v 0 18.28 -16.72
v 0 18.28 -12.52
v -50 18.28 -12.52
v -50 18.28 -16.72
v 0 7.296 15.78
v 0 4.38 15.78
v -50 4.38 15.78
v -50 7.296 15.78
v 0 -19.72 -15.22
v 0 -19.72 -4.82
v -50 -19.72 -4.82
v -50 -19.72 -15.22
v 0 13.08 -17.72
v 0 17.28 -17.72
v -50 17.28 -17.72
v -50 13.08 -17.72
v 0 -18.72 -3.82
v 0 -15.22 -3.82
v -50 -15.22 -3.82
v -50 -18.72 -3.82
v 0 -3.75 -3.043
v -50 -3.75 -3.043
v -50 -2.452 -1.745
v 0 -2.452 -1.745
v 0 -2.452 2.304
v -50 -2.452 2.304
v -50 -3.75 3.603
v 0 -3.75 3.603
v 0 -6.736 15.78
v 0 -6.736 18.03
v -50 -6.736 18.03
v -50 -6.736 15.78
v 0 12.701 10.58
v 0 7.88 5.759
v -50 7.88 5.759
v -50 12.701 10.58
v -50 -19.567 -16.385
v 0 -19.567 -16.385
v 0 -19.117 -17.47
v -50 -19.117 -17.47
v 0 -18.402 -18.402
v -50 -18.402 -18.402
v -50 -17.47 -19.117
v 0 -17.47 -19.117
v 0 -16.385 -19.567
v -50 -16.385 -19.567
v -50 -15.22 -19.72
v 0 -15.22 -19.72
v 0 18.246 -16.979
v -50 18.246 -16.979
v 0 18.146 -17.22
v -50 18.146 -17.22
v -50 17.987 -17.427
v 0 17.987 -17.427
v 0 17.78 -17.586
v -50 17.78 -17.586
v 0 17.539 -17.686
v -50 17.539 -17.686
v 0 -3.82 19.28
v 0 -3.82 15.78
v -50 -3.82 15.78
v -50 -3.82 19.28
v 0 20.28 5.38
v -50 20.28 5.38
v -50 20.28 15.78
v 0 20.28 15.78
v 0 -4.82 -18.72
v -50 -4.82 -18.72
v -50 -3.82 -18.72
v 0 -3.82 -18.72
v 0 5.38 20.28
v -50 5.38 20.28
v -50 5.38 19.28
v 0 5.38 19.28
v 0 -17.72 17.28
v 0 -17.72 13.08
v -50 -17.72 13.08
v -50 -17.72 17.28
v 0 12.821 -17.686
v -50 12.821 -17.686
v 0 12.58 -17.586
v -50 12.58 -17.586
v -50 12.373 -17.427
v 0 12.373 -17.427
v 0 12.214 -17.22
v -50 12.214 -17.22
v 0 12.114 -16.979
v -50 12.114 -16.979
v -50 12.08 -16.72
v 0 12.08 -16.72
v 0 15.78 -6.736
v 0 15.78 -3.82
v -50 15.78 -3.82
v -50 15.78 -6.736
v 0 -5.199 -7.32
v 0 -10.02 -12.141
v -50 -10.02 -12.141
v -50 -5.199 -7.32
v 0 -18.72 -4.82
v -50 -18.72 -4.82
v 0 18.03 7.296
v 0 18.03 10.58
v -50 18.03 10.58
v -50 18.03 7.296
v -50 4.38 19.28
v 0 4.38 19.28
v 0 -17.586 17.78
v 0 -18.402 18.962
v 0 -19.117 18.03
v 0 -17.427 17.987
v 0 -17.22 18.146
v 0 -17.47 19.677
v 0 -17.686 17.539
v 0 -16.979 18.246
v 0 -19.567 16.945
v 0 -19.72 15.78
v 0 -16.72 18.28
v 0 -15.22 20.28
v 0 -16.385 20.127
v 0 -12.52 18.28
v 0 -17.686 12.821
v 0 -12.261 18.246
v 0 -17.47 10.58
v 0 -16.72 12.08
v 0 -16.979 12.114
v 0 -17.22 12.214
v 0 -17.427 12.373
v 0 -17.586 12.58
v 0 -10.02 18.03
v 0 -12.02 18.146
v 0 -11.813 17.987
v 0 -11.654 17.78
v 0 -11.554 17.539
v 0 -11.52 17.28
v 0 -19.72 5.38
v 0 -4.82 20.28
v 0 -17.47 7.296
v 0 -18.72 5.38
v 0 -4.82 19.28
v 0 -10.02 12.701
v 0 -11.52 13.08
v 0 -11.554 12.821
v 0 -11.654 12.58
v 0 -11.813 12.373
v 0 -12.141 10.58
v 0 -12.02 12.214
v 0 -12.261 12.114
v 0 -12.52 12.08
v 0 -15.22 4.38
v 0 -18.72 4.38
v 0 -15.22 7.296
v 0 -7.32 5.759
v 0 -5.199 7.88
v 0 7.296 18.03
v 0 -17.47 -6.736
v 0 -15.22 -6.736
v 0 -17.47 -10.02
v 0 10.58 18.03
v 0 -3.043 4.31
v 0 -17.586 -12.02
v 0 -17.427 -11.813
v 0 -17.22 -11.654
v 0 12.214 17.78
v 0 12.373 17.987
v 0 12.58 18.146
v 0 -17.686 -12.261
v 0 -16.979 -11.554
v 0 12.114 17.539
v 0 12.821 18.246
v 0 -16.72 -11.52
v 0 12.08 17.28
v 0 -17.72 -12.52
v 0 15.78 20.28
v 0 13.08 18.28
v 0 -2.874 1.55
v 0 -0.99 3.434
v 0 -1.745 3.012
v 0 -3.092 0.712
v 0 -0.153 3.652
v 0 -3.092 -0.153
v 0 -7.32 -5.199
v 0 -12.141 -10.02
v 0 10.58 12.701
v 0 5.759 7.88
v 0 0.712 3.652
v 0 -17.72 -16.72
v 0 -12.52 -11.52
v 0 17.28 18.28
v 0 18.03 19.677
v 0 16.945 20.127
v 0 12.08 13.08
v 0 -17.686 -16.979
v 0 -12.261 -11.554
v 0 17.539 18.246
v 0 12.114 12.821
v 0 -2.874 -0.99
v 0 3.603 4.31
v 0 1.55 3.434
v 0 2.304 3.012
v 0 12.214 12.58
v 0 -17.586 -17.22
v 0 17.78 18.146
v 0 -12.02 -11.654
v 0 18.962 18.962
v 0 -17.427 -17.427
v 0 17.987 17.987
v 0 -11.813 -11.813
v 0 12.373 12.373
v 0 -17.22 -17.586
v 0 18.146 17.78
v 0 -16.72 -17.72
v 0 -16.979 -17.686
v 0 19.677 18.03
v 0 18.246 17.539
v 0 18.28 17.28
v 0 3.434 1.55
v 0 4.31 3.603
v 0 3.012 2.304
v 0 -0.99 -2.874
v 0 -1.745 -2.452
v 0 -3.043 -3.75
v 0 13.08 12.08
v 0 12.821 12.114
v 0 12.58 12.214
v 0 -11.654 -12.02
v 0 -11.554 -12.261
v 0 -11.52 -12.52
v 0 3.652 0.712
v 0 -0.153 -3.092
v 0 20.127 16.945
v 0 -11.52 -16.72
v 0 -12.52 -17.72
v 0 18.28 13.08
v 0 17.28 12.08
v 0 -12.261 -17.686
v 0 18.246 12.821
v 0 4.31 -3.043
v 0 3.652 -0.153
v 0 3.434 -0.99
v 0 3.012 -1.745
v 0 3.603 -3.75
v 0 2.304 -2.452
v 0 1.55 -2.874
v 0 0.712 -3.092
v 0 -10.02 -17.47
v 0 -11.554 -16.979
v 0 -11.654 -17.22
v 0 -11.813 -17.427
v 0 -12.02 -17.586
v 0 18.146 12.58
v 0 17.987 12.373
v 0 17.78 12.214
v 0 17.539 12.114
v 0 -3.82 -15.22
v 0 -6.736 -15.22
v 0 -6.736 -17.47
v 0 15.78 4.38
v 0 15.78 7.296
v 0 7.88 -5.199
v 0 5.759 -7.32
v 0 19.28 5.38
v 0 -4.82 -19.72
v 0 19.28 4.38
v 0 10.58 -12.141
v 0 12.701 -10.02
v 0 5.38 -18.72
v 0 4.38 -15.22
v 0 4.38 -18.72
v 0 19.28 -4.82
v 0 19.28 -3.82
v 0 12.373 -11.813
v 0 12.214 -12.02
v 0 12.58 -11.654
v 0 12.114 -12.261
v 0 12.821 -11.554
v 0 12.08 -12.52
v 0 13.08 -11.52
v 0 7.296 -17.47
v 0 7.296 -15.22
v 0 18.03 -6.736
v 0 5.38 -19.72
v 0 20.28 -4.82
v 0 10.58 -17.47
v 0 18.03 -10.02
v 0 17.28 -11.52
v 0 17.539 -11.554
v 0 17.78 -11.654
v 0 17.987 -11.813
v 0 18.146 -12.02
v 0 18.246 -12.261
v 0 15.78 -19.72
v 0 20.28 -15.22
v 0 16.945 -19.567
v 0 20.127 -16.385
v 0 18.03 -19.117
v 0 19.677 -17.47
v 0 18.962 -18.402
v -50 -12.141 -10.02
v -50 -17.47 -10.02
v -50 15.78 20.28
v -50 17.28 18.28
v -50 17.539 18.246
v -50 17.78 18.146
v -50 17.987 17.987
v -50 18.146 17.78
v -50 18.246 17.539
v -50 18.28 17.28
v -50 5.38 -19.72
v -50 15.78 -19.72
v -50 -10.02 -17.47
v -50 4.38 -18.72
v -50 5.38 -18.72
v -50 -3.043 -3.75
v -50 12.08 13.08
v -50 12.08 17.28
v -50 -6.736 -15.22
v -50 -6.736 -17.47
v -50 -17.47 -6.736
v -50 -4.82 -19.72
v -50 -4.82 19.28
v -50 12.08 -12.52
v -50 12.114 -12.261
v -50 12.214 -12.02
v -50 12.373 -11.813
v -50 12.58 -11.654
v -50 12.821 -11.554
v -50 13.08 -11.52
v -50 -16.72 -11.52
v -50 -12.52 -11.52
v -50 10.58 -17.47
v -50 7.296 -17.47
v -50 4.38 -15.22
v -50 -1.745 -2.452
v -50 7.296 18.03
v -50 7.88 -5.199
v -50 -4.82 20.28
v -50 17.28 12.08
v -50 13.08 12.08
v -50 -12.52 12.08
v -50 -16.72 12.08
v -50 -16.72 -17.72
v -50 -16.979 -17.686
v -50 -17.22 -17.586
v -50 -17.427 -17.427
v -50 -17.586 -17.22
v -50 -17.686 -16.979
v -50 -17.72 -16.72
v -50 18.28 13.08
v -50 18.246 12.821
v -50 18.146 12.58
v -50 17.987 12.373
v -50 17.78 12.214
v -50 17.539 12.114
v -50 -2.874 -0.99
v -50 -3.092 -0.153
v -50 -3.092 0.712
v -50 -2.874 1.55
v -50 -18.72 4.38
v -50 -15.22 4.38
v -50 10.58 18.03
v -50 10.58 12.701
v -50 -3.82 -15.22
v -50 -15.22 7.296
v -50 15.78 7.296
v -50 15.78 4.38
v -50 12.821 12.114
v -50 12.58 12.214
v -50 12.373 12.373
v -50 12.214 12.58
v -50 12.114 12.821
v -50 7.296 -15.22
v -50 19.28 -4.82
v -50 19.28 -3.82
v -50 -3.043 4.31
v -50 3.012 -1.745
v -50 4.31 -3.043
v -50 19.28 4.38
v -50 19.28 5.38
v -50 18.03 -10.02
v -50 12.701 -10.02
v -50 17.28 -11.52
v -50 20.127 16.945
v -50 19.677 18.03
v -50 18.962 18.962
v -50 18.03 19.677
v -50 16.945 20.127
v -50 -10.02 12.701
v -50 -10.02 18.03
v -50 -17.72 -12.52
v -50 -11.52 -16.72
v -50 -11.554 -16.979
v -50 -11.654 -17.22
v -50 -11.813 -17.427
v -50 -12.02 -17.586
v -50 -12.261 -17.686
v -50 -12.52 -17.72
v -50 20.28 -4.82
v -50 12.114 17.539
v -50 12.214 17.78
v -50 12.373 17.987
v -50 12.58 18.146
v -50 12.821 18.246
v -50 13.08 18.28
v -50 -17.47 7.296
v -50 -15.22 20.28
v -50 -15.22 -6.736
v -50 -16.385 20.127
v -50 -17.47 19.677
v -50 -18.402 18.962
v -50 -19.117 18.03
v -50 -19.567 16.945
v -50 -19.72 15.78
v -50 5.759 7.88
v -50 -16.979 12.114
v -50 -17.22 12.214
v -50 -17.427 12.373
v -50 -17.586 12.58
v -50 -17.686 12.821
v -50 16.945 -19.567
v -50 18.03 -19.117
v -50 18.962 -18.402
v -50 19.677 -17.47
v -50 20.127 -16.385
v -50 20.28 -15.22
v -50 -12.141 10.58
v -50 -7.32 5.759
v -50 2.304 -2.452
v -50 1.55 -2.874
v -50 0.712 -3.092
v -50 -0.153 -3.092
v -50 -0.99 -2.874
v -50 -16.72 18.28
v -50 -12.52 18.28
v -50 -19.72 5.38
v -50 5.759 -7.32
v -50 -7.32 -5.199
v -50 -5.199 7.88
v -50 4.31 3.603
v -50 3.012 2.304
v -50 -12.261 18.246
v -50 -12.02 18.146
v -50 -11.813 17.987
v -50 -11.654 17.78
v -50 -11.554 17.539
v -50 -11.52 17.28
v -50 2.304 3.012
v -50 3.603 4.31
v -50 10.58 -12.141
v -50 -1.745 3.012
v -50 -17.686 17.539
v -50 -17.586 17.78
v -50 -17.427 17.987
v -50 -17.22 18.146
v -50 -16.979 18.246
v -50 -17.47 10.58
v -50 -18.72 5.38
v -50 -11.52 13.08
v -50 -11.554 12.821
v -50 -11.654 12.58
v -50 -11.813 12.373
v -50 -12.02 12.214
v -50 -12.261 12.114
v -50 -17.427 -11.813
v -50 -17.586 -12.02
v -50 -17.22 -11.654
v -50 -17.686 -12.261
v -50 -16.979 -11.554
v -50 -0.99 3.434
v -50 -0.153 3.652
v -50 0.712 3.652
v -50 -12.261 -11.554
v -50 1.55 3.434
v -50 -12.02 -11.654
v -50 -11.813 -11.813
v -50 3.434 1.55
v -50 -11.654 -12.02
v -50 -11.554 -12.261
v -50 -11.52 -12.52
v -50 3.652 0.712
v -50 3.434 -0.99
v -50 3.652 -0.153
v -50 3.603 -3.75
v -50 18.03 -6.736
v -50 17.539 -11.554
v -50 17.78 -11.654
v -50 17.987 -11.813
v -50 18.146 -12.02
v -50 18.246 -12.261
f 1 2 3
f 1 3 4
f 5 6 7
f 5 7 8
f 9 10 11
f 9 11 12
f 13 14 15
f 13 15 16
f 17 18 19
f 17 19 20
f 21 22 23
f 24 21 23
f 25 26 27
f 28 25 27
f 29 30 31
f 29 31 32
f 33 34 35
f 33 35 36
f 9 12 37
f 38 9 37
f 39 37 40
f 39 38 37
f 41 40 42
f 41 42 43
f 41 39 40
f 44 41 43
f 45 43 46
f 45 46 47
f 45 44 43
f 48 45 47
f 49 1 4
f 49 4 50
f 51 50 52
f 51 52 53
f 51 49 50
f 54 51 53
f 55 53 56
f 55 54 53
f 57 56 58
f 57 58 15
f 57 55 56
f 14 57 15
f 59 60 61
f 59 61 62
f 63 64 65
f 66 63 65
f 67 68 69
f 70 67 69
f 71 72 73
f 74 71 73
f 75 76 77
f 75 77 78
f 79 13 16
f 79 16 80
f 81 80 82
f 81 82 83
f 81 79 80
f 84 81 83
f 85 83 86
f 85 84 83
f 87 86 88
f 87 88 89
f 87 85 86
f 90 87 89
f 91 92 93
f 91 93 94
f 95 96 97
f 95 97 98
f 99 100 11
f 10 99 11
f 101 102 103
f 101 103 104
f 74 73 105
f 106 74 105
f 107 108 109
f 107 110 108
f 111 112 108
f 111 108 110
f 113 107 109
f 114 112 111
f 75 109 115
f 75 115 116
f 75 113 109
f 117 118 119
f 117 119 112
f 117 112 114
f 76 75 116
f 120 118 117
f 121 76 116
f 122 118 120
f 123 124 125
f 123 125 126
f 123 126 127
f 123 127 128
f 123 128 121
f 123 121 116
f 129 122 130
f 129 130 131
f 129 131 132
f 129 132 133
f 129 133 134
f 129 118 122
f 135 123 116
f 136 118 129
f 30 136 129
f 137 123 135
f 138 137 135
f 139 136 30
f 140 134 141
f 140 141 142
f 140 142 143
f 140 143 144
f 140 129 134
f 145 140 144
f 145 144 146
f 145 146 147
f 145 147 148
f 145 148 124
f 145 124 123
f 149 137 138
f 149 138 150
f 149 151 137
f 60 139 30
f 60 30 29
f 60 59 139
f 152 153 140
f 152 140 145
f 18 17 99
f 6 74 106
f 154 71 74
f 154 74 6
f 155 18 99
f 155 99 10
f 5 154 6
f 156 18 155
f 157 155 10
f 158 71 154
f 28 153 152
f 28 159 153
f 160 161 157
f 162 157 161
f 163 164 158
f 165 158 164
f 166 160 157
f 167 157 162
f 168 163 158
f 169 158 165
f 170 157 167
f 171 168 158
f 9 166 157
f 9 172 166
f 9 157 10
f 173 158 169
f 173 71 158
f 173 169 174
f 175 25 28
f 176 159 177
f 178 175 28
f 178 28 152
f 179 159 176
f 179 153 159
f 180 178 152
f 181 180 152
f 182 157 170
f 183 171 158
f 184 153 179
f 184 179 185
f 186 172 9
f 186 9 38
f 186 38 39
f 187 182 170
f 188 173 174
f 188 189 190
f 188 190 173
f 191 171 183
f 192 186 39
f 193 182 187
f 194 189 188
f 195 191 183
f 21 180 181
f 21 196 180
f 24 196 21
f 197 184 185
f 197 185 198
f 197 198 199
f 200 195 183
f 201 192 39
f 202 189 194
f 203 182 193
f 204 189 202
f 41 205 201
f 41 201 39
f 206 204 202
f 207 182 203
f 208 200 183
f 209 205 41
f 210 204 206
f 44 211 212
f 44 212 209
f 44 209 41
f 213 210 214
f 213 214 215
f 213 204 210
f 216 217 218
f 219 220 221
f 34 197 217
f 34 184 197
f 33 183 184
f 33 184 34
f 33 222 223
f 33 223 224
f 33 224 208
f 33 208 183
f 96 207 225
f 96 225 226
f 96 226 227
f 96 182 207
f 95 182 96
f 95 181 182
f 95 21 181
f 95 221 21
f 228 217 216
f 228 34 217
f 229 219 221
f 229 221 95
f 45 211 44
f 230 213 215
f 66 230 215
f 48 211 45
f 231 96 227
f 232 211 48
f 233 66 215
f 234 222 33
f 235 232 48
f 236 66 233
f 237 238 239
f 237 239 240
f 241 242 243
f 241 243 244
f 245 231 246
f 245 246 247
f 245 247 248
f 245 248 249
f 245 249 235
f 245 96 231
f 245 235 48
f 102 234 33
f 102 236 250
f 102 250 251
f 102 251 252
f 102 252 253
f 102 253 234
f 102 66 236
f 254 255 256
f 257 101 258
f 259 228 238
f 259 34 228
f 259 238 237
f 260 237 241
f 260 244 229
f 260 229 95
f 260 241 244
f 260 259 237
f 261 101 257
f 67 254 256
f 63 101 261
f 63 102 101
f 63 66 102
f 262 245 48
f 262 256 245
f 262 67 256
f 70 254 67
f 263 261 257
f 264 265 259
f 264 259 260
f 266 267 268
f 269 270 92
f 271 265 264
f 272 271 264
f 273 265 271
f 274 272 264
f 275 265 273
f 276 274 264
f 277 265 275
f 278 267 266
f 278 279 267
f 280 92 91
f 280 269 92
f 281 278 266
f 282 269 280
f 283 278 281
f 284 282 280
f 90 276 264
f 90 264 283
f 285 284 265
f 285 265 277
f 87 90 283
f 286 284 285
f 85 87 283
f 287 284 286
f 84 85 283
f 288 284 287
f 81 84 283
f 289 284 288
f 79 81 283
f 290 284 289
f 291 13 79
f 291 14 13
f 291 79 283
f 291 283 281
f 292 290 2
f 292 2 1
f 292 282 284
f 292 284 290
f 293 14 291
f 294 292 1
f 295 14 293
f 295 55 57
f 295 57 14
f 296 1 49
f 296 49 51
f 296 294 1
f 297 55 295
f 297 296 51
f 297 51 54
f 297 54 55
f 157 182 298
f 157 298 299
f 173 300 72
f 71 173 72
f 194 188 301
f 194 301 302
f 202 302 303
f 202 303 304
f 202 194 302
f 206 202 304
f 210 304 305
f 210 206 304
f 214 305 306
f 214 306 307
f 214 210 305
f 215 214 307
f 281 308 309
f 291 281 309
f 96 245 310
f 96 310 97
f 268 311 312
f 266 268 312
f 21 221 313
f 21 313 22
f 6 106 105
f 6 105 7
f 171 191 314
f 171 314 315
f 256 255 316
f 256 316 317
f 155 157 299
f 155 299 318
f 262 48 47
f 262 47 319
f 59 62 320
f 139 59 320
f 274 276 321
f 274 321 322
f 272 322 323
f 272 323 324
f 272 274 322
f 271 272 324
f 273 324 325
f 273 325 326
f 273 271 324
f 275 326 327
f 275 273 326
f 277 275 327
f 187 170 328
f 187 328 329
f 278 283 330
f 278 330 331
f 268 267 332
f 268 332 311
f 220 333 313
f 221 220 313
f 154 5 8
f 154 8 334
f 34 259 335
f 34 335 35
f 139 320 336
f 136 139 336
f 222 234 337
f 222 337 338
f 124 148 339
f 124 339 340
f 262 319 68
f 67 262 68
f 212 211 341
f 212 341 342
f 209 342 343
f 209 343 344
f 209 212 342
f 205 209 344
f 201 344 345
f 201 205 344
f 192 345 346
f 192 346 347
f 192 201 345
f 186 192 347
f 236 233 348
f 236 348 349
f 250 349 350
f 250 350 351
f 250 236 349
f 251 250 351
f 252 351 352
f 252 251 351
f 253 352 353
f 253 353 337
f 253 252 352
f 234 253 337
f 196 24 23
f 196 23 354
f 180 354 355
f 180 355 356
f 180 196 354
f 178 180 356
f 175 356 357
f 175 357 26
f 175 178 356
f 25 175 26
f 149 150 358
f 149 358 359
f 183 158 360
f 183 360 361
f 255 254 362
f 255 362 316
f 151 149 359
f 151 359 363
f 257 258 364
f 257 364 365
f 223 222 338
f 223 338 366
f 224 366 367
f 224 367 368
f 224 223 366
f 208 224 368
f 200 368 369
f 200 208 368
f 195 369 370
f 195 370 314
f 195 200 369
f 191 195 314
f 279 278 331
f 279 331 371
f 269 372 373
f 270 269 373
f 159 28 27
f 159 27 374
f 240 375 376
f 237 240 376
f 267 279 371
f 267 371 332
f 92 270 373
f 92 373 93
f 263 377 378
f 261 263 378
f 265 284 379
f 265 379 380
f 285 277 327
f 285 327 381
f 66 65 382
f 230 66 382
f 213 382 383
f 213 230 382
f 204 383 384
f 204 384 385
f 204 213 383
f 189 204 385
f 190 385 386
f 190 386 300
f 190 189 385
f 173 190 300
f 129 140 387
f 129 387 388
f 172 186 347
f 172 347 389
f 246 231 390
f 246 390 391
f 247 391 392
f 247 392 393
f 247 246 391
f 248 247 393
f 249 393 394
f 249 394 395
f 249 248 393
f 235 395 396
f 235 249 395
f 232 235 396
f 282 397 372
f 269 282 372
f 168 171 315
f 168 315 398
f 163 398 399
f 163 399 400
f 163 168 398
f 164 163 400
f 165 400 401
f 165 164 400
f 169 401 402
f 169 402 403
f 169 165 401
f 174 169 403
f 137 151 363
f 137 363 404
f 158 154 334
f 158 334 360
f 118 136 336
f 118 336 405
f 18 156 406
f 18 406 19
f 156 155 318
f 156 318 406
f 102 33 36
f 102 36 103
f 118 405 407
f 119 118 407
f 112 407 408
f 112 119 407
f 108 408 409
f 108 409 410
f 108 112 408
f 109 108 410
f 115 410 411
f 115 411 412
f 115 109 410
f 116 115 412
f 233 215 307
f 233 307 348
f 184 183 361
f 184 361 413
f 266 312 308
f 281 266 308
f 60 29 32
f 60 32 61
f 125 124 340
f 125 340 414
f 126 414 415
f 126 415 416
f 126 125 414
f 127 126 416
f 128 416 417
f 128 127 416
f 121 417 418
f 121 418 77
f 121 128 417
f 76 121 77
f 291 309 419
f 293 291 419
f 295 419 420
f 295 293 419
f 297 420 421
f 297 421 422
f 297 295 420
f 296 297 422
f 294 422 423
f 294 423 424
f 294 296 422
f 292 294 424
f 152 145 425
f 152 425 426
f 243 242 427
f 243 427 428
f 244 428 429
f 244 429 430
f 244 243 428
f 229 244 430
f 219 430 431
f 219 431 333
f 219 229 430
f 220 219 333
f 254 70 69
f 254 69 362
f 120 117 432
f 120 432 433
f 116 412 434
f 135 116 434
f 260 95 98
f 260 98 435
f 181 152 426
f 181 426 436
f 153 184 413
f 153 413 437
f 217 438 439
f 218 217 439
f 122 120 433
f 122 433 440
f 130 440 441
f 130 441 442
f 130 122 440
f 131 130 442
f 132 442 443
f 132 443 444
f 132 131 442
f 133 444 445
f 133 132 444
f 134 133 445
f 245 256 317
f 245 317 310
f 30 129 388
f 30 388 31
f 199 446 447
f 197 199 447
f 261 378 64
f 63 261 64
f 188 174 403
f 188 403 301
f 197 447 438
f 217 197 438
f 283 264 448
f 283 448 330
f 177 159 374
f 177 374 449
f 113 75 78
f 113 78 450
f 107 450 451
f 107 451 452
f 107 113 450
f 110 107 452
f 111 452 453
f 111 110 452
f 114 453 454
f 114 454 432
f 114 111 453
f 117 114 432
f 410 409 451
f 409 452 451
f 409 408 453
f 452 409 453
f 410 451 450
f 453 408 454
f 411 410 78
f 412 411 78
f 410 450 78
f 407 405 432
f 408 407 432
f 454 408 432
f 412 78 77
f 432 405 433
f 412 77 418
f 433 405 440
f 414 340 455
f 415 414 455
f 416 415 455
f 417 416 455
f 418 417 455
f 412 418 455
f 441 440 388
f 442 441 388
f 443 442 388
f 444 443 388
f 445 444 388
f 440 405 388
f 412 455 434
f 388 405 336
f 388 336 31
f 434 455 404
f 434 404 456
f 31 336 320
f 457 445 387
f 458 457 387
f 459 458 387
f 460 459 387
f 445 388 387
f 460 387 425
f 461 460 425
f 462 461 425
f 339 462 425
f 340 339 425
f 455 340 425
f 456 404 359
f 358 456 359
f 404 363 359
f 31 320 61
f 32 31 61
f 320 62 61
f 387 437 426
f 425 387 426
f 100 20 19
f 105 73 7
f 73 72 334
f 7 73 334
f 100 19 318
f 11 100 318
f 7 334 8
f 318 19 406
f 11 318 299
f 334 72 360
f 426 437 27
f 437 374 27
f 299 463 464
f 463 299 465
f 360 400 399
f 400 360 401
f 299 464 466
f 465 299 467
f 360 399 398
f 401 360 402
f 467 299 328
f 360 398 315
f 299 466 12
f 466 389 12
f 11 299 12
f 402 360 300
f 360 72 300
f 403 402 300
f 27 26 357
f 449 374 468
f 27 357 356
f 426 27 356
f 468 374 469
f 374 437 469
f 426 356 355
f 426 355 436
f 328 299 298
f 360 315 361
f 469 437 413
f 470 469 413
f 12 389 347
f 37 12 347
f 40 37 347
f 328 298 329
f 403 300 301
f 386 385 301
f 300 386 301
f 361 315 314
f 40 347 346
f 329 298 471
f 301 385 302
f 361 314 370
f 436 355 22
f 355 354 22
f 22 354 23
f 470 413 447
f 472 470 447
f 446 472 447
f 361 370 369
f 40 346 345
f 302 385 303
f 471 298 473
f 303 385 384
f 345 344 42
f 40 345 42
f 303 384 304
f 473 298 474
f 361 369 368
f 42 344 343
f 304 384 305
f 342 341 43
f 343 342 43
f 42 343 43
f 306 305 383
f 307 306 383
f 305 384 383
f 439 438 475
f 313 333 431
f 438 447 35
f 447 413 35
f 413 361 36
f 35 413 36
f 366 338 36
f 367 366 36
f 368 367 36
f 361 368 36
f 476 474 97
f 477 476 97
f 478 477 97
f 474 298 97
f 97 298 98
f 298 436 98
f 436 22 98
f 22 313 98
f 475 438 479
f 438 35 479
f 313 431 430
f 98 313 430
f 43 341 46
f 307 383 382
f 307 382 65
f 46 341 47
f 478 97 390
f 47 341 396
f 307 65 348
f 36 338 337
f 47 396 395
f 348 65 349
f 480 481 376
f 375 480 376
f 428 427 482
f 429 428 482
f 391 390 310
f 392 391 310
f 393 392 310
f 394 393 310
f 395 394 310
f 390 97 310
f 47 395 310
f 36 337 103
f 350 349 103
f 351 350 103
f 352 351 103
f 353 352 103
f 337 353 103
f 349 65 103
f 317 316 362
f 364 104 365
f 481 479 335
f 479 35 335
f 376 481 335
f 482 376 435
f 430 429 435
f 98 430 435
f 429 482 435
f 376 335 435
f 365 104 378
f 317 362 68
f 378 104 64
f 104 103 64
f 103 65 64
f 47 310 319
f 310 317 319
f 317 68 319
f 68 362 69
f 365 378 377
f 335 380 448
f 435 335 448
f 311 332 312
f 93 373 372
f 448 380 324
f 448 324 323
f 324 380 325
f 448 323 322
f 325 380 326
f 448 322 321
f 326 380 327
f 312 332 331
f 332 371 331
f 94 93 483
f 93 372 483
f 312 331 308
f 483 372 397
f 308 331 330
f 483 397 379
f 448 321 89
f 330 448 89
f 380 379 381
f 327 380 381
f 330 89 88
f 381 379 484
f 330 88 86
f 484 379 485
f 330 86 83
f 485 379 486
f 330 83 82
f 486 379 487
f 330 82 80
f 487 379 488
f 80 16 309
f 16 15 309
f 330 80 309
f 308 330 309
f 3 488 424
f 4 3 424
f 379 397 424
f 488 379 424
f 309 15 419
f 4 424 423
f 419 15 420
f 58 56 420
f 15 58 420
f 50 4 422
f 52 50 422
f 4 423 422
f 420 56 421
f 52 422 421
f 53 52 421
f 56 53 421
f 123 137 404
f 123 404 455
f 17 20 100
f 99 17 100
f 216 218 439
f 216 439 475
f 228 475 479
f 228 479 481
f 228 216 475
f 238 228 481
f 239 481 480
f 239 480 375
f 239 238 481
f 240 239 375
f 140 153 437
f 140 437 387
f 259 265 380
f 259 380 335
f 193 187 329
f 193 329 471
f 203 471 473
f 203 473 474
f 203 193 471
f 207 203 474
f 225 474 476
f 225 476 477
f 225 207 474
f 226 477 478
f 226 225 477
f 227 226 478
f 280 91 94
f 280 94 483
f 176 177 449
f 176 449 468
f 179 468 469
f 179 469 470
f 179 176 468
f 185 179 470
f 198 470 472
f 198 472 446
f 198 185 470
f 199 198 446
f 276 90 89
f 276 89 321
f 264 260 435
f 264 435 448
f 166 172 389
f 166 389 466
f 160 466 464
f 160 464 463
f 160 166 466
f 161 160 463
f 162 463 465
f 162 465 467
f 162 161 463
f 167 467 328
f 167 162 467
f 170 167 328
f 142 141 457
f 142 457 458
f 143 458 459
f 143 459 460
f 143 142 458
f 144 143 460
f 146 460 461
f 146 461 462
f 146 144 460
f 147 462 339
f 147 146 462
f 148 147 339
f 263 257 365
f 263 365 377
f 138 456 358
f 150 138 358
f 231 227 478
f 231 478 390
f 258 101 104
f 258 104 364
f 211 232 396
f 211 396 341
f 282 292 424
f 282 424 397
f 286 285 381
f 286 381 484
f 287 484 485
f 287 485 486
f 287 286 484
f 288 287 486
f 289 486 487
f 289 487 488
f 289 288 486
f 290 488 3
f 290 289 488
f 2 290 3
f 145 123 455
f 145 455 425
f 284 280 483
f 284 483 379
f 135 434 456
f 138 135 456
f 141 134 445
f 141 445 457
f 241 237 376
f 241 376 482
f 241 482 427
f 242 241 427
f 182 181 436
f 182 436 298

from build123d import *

# Parameters (mm, degrees)
EXTRUDE_1_DEPTH = 50


with BuildPart() as part:
    # 草图1 → 凸台-拉伸1 (new body)
    with BuildSketch(Plane(origin=(0, 0, 0), x_dir=(0, 0, -1), z_dir=(1, 0, 0))):
        with BuildLine():
            Line((4.82004008, 19.27995992), (3.82004008, 19.27995992))
            Line((3.82004008, 19.27995992), (3.82004008, 15.77995992))
            Line((3.82004008, 15.77995992), (6.73639159, 15.77995992))
            Line((6.73639159, 15.77995992), (6.73639159, 18.02995992))
            Line((6.73639159, 18.02995992), (10.02004008, 18.02995992))
            Line((10.02004008, 18.02995992), (10.02004008, 12.70128026))
            Line((10.02004008, 12.70128026), (5.19871974, 7.87995992))
            Line((5.19871974, 7.87995992), (-5.75863958, 7.87995992))
            Line((-5.75863958, 7.87995992), (-10.57995992, 12.70128026))
            Line((-10.57995992, 12.70128026), (-10.57995992, 18.02995992))
            Line((-10.57995992, 18.02995992), (-7.29631143, 18.02995992))
            Line((-7.29631143, 18.02995992), (-7.29631143, 15.77995992))
            Line((-7.29631143, 15.77995992), (-4.37995992, 15.77995992))
            Line((-4.37995992, 15.77995992), (-4.37995992, 19.27995992))
            Line((-4.37995992, 19.27995992), (-5.37995992, 19.27995992))
            Line((-5.37995992, 19.27995992), (-5.37995992, 20.27995992))
            Line((-5.37995992, 20.27995992), (-15.77995992, 20.27995992))
            ThreePointArc((-15.77995992, 20.27995992), (-18.961940435, 18.961940435), (-20.27995992, 15.77995992))
            Line((-20.27995992, 15.77995992), (-20.27995992, 5.37995992))
            Line((-20.27995992, 5.37995992), (-19.27995992, 5.37995992))
            Line((-19.27995992, 5.37995992), (-19.27995992, 4.37995992))
            Line((-19.27995992, 4.37995992), (-15.77995992, 4.37995992))
            Line((-15.77995992, 4.37995992), (-15.77995992, 7.29631143))
            Line((-15.77995992, 7.29631143), (-18.02995992, 7.29631143))
            Line((-18.02995992, 7.29631143), (-18.02995992, 10.57995992))
            Line((-18.02995992, 10.57995992), (-12.70128026, 10.57995992))
            Line((-12.70128026, 10.57995992), (-7.87995992, 5.75863958))
            Line((-7.87995992, 5.75863958), (-7.87995992, -5.19871974))
            Line((-7.87995992, -5.19871974), (-12.70128026, -10.02004008))
            Line((-12.70128026, -10.02004008), (-18.02995992, -10.02004008))
            Line((-18.02995992, -10.02004008), (-18.02995992, -6.73639159))
            Line((-18.02995992, -6.73639159), (-15.77995992, -6.73639159))
            Line((-15.77995992, -6.73639159), (-15.77995992, -3.82004008))
            Line((-15.77995992, -3.82004008), (-19.27995992, -3.82004008))
            Line((-19.27995992, -3.82004008), (-19.27995992, -4.82004008))
            Line((-19.27995992, -4.82004008), (-20.27995992, -4.82004008))
            Line((-20.27995992, -4.82004008), (-20.27995992, -15.22004008))
            ThreePointArc((-20.27995992, -15.22004008), (-18.961940435, -18.402020595), (-15.77995992, -19.72004008))
            Line((-15.77995992, -19.72004008), (-5.37995992, -19.72004008))
            Line((-5.37995992, -19.72004008), (-5.37995992, -18.72004008))
            Line((-5.37995992, -18.72004008), (-4.37995992, -18.72004008))
            Line((-4.37995992, -18.72004008), (-4.37995992, -15.22004008))
            Line((-4.37995992, -15.22004008), (-7.29631143, -15.22004008))
            Line((-7.29631143, -15.22004008), (-7.29631143, -17.47004008))
            Line((-7.29631143, -17.47004008), (-10.57995992, -17.47004008))
            Line((-10.57995992, -17.47004008), (-10.57995992, -12.14136042))
            Line((-10.57995992, -12.14136042), (-5.75863958, -7.32004008))
            Line((-5.75863958, -7.32004008), (5.19871974, -7.32004008))
            Line((5.19871974, -7.32004008), (10.02004008, -12.14136042))
            Line((10.02004008, -12.14136042), (10.02004008, -17.47004008))
            Line((10.02004008, -17.47004008), (6.73639159, -17.47004008))
            Line((6.73639159, -17.47004008), (6.73639159, -15.22004008))
            Line((6.73639159, -15.22004008), (3.82004008, -15.22004008))
            Line((3.82004008, -15.22004008), (3.82004008, -18.72004008))
            Line((3.82004008, -18.72004008), (4.82004008, -18.72004008))
            Line((4.82004008, -18.72004008), (4.82004008, -19.72004008))
            Line((4.82004008, -19.72004008), (15.22004008, -19.72004008))
            ThreePointArc((15.22004008, -19.72004008), (18.402020595, -18.402020595), (19.72004008, -15.22004008))
            Line((19.72004008, -15.22004008), (19.72004008, -4.82004008))
            Line((19.72004008, -4.82004008), (18.72004008, -4.82004008))
            Line((18.72004008, -4.82004008), (18.72004008, -3.82004008))
            Line((18.72004008, -3.82004008), (15.22004008, -3.82004008))
            Line((15.22004008, -3.82004008), (15.22004008, -6.73639159))
            Line((15.22004008, -6.73639159), (17.47004008, -6.73639159))
            Line((17.47004008, -6.73639159), (17.47004008, -10.02004008))
            Line((17.47004008, -10.02004008), (12.14136042, -10.02004008))
            Line((12.14136042, -10.02004008), (7.32004008, -5.19871974))
            Line((7.32004008, -5.19871974), (7.32004008, 5.75863958))
            Line((7.32004008, 5.75863958), (12.14136042, 10.57995992))
            Line((12.14136042, 10.57995992), (17.47004008, 10.57995992))
            Line((17.47004008, 10.57995992), (17.47004008, 7.29631143))
            Line((17.47004008, 7.29631143), (15.22004008, 7.29631143))
            Line((15.22004008, 7.29631143), (15.22004008, 4.37995992))
            Line((15.22004008, 4.37995992), (18.72004008, 4.37995992))
            Line((18.72004008, 4.37995992), (18.72004008, 5.37995992))
            Line((18.72004008, 5.37995992), (19.72004008, 5.37995992))
            Line((19.72004008, 5.37995992), (19.72004008, 15.77995992))
            ThreePointArc((19.72004008, 15.77995992), (18.402020595, 18.961940435), (15.22004008, 20.27995992))
            Line((15.22004008, 20.27995992), (4.82004008, 20.27995992))
            Line((4.82004008, 20.27995992), (4.82004008, 19.27995992))
        make_face()
        with BuildLine():
            Line((-13.07995992, -17.72004008), (-17.27995992, -17.72004008))
            ThreePointArc((-17.27995992, -17.72004008), (-17.987066701, -17.427146861), (-18.27995992, -16.72004008))
            Line((-18.27995992, -16.72004008), (-18.27995992, -12.52004008))
            ThreePointArc((-18.27995992, -12.52004008), (-17.987066701, -11.812933299), (-17.27995992, -11.52004008))
            Line((-17.27995992, -11.52004008), (-13.07995992, -11.52004008))
            ThreePointArc((-13.07995992, -11.52004008), (-12.372853139, -11.812933299), (-12.07995992, -12.52004008))
            Line((-12.07995992, -12.52004008), (-12.07995992, -16.72004008))
            ThreePointArc((-12.07995992, -16.72004008), (-12.372853139, -17.427146861), (-13.07995992, -17.72004008))
        make_face(mode=Mode.SUBTRACT)
        with BuildLine():
            Line((-17.27995992, 18.27995992), (-13.07995992, 18.27995992))
            ThreePointArc((-13.07995992, 18.27995992), (-12.372853139, 17.987066701), (-12.07995992, 17.27995992))
            Line((-12.07995992, 17.27995992), (-12.07995992, 13.07995992))
            ThreePointArc((-12.07995992, 13.07995992), (-12.372853139, 12.372853139), (-13.07995992, 12.07995992))
            Line((-13.07995992, 12.07995992), (-17.27995992, 12.07995992))
            ThreePointArc((-17.27995992, 12.07995992), (-17.987066701, 12.372853139), (-18.27995992, 13.07995992))
            Line((-18.27995992, 13.07995992), (-18.27995992, 17.27995992))
            ThreePointArc((-18.27995992, 17.27995992), (-17.987066701, 17.987066701), (-17.27995992, 18.27995992))
        make_face(mode=Mode.SUBTRACT)
        with BuildLine():
            Line((16.72004008, 12.07995992), (12.52004008, 12.07995992))
            ThreePointArc((12.52004008, 12.07995992), (11.812933299, 12.372853139), (11.52004008, 13.07995992))
            Line((11.52004008, 13.07995992), (11.52004008, 17.27995992))
            ThreePointArc((11.52004008, 17.27995992), (11.812933299, 17.987066701), (12.52004008, 18.27995992))
            Line((12.52004008, 18.27995992), (16.72004008, 18.27995992))
            ThreePointArc((16.72004008, 18.27995992), (17.427146861, 17.987066701), (17.72004008, 17.27995992))
            Line((17.72004008, 17.27995992), (17.72004008, 13.07995992))
            ThreePointArc((17.72004008, 13.07995992), (17.427146861, 12.372853139), (16.72004008, 12.07995992))
        make_face(mode=Mode.SUBTRACT)
        with BuildLine():
            Line((3.75045895, -3.04335217), (3.04335217, -3.75045895))
            Line((3.04335217, -3.75045895), (1.74451108, -2.45161786))
            ThreePointArc((1.74451108, -2.45161786), (-0.27995992, -3.12004008), (-2.30443092, -2.45161786))
            Line((-2.30443092, -2.45161786), (-3.60327201, -3.75045895))
            Line((-3.60327201, -3.75045895), (-4.31037879, -3.04335217))
            Line((-4.31037879, -3.04335217), (-3.0115377, -1.74451108))
            ThreePointArc((-3.0115377, -1.74451108), (-3.67995992, 0.27995992), (-3.0115377, 2.30443092))
            Line((-3.0115377, 2.30443092), (-4.31037879, 3.60327201))
            Line((-4.31037879, 3.60327201), (-3.60327201, 4.31037879))
            Line((-3.60327201, 4.31037879), (-2.30443092, 3.0115377))
            ThreePointArc((-2.30443092, 3.0115377), (-0.27995992, 3.67995992), (1.74451108, 3.0115377))
            Line((1.74451108, 3.0115377), (3.04335217, 4.31037879))
            Line((3.04335217, 4.31037879), (3.75045895, 3.60327201))
            Line((3.75045895, 3.60327201), (2.45161786, 2.30443092))
            ThreePointArc((2.45161786, 2.30443092), (3.12004008, 0.27995992), (2.45161786, -1.74451108))
            Line((2.45161786, -1.74451108), (3.75045895, -3.04335217))
        make_face(mode=Mode.SUBTRACT)
        with BuildLine():
            Line((17.72004008, -12.52004008), (17.72004008, -16.72004008))
            ThreePointArc((17.72004008, -16.72004008), (17.427146861, -17.427146861), (16.72004008, -17.72004008))
            Line((16.72004008, -17.72004008), (12.52004008, -17.72004008))
            ThreePointArc((12.52004008, -17.72004008), (11.812933299, -17.427146861), (11.52004008, -16.72004008))
            Line((11.52004008, -16.72004008), (11.52004008, -12.52004008))
            ThreePointArc((11.52004008, -12.52004008), (11.812933299, -11.812933299), (12.52004008, -11.52004008))
            Line((12.52004008, -11.52004008), (16.72004008, -11.52004008))
            ThreePointArc((16.72004008, -11.52004008), (17.427146861, -11.812933299), (17.72004008, -12.52004008))
        make_face(mode=Mode.SUBTRACT)
    extrude(amount=-EXTRUDE_1_DEPTH)


solid = part.part
